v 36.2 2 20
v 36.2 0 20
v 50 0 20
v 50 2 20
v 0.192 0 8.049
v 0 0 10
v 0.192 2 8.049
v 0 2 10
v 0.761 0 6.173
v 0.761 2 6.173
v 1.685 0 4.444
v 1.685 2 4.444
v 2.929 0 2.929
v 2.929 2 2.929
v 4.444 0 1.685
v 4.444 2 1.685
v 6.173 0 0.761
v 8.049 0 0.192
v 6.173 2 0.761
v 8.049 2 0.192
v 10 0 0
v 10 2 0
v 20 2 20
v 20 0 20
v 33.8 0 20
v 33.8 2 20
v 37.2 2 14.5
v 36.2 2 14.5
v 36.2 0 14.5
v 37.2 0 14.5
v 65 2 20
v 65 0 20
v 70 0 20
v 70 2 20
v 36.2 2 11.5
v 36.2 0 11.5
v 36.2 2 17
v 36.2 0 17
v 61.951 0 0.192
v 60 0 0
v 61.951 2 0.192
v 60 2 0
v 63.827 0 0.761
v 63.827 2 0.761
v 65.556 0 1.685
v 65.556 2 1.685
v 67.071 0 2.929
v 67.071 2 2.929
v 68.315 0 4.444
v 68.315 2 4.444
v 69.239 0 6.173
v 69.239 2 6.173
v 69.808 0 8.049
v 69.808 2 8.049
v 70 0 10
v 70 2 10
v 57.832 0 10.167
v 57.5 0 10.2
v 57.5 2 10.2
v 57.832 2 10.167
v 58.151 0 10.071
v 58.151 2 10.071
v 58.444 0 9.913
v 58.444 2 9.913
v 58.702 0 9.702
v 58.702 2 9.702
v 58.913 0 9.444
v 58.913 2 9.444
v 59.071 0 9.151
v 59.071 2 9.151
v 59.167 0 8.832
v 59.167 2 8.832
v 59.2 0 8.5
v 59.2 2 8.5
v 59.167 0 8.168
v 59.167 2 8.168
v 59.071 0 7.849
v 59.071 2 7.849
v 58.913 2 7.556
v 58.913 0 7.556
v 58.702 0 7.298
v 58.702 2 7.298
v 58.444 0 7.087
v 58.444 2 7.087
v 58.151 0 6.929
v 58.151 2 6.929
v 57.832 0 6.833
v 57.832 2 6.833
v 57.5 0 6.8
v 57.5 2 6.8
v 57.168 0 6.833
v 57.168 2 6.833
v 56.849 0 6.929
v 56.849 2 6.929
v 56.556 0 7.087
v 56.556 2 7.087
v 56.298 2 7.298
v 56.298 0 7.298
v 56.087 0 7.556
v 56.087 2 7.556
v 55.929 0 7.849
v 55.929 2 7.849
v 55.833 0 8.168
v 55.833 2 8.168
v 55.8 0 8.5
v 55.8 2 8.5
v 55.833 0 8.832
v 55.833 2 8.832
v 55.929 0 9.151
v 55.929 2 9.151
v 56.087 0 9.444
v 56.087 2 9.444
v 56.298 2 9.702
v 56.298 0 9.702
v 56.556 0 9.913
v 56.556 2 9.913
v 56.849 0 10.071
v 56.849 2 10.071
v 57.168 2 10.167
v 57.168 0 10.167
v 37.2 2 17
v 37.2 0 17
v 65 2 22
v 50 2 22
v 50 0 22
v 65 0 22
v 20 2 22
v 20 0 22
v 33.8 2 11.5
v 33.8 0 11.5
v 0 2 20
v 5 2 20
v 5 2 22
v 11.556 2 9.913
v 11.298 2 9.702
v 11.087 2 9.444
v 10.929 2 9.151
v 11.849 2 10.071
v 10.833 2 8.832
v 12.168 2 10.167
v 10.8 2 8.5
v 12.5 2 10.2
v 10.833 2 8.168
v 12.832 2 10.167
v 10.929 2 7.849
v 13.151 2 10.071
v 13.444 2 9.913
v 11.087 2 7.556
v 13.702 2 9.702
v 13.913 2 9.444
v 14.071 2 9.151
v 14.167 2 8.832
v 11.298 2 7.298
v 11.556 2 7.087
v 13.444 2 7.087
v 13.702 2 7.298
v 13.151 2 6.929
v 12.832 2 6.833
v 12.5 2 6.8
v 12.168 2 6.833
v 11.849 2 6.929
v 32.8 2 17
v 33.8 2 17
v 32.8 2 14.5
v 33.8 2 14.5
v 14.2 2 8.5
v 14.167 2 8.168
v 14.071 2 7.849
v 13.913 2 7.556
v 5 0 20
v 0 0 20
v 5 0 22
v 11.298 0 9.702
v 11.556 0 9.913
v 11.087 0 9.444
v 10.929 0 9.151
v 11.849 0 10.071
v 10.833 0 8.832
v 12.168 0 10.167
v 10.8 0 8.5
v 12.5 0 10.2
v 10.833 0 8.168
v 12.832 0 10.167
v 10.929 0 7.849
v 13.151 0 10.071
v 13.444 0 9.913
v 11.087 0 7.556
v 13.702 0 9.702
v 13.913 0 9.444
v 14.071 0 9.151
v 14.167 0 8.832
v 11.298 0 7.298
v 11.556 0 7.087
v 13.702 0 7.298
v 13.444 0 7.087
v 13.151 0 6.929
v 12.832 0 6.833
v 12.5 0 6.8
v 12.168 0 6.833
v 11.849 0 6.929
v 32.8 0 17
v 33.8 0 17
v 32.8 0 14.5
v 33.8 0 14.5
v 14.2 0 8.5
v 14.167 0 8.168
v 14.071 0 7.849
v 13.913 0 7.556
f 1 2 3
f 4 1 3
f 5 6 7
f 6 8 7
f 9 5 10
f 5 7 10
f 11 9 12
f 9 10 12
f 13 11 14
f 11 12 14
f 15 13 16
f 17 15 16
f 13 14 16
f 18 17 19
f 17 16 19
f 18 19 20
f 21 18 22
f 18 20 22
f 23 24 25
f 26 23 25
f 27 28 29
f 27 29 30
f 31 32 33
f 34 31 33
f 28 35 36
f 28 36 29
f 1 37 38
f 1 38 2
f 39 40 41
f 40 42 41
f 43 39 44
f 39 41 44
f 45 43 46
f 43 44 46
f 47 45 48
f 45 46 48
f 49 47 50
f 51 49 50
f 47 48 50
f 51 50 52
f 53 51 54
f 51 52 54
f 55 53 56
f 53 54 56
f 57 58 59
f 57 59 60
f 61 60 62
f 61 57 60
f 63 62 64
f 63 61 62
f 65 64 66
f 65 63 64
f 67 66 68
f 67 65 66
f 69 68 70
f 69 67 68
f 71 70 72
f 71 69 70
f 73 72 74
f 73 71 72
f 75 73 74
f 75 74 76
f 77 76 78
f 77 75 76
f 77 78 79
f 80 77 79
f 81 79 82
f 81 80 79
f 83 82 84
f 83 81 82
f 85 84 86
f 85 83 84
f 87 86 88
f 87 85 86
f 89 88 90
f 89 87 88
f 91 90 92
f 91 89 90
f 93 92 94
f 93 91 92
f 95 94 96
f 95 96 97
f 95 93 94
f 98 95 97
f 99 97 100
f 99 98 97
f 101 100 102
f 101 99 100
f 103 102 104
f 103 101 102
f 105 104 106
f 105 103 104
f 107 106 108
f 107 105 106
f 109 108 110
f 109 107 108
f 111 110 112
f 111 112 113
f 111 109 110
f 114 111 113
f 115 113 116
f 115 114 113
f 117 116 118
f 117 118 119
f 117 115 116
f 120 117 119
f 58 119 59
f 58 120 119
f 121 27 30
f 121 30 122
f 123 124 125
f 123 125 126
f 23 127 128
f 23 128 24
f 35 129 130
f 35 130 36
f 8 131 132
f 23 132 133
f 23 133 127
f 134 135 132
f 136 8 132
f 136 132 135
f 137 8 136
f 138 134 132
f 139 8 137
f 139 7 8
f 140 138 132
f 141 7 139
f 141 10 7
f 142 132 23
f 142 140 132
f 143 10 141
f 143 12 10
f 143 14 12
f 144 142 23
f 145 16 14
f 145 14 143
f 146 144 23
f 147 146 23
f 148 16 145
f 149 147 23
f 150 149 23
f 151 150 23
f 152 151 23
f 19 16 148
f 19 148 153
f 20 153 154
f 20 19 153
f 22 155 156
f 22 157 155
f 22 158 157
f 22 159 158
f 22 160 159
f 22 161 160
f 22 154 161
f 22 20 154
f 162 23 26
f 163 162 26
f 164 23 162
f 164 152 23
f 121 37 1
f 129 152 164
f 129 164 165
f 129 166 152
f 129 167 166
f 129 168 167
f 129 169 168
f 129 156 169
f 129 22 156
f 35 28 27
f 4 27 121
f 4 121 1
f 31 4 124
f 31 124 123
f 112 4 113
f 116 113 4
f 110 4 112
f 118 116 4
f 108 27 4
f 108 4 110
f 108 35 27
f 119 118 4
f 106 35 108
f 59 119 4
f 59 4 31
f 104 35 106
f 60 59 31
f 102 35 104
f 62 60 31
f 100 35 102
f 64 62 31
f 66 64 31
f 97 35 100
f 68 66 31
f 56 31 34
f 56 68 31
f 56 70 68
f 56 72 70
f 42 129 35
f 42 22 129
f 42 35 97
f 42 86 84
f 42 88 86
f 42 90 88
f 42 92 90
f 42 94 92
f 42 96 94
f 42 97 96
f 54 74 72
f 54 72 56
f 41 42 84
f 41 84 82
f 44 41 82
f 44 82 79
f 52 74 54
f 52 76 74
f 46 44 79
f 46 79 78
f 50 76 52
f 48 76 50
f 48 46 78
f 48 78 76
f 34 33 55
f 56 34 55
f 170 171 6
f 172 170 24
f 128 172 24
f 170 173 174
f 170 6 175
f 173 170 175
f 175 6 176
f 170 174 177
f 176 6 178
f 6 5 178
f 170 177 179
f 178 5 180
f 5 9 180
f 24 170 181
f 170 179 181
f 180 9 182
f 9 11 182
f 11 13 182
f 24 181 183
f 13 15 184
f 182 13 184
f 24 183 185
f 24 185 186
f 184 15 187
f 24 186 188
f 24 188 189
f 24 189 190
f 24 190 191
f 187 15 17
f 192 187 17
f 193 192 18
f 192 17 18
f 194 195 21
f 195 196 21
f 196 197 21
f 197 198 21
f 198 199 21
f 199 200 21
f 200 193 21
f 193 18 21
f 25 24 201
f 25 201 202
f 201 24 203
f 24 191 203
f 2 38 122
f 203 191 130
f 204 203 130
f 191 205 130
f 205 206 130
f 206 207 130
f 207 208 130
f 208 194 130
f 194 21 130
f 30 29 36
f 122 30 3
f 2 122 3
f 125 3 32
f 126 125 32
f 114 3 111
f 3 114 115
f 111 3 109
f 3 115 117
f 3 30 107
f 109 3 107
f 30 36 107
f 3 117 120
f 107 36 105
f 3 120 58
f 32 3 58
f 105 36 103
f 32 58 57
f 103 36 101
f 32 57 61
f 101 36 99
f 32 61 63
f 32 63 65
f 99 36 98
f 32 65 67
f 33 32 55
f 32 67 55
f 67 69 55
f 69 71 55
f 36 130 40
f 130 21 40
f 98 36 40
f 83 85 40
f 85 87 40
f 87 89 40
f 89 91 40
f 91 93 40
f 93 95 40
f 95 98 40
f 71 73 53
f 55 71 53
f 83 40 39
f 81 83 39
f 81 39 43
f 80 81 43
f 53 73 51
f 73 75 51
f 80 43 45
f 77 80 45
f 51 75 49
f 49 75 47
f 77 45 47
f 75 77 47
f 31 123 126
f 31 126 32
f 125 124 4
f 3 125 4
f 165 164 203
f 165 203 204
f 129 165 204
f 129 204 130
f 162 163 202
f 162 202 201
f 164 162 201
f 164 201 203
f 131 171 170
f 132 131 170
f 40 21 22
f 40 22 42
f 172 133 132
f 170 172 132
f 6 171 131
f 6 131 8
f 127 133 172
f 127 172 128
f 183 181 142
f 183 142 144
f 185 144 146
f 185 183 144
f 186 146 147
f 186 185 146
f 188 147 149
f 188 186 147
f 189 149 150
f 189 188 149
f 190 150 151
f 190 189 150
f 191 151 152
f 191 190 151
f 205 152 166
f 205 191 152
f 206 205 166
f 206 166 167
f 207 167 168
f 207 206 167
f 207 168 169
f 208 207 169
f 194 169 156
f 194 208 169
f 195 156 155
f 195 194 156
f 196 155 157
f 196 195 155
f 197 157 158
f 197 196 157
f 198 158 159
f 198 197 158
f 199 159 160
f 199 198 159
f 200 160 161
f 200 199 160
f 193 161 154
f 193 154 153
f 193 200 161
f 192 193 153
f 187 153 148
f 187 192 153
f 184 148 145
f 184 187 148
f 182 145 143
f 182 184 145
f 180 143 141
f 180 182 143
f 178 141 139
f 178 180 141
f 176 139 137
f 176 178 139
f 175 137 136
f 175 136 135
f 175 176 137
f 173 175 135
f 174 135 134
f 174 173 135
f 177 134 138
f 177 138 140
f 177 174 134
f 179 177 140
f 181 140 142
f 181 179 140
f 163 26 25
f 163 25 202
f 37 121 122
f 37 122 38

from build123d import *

# Parameters (mm, degrees)
SKETCH_1_W          = 70
SKETCH_1_H          = 20
SKETCH_1_R          = 1.7
EXTRUDE_1_DEPTH     = 2
CUT_EXTRUDE_1_DEPTH = 2
SKETCH_3_W          = 15
SKETCH_3_H          = 2
EXTRUDE_2_DEPTH     = 2
FILLET_1_R          = 10


with BuildPart() as part:
    # 草图1 → 凸台-拉伸1 (new body)
    with BuildSketch(Plane(origin=(0, 0, 0), x_dir=(1, 0, 0), z_dir=(0, 1, 0))):
        with Locations((35, -10)):
            Rectangle(SKETCH_1_W, SKETCH_1_H)
        with Locations(Location((57.5, -8.5, 0), (0, 0, 270))):
            Circle(SKETCH_1_R, mode=Mode.SUBTRACT)
        with Locations(Location((12.5, -8.5, 0), (0, 0, 270))):
            Circle(SKETCH_1_R, mode=Mode.SUBTRACT)
    extrude(amount=EXTRUDE_1_DEPTH)

    # 草图2 → 切除-拉伸1 (cut)
    with BuildSketch(Plane(origin=(0, 2, 0), x_dir=(1, 0, 0), z_dir=(0, 1, 0))):
        Polygon((33.8, -20), (33.8, -17), (32.8, -17), (32.8, -14.5), (33.8, -14.5), (33.8, -11.5), (36.2, -11.5), (36.2, -14.5), (37.2, -14.5), (37.2, -17), (36.2, -17), (36.2, -20), align=None)
    extrude(amount=-CUT_EXTRUDE_1_DEPTH, mode=Mode.SUBTRACT)

    # 草图3 → 凸台-拉伸2 (add)
    with BuildSketch(Plane(origin=(0, 2, 0), x_dir=(1, 0, 0), z_dir=(0, 1, 0))):
        with Locations((12.5, -21)):
            Rectangle(SKETCH_3_W, SKETCH_3_H)
        with Locations((57.5, -21)):
            Rectangle(SKETCH_3_W, SKETCH_3_H)
    extrude(amount=-EXTRUDE_2_DEPTH)

    # 圆角1
    fillet_1_edges = [part.edges().sort_by_distance(p)[0] for p in [
        (0, 1, 0),
        (70, 1, 0),
    ]]
    fillet(fillet_1_edges, radius=FILLET_1_R)


solid = part.part
